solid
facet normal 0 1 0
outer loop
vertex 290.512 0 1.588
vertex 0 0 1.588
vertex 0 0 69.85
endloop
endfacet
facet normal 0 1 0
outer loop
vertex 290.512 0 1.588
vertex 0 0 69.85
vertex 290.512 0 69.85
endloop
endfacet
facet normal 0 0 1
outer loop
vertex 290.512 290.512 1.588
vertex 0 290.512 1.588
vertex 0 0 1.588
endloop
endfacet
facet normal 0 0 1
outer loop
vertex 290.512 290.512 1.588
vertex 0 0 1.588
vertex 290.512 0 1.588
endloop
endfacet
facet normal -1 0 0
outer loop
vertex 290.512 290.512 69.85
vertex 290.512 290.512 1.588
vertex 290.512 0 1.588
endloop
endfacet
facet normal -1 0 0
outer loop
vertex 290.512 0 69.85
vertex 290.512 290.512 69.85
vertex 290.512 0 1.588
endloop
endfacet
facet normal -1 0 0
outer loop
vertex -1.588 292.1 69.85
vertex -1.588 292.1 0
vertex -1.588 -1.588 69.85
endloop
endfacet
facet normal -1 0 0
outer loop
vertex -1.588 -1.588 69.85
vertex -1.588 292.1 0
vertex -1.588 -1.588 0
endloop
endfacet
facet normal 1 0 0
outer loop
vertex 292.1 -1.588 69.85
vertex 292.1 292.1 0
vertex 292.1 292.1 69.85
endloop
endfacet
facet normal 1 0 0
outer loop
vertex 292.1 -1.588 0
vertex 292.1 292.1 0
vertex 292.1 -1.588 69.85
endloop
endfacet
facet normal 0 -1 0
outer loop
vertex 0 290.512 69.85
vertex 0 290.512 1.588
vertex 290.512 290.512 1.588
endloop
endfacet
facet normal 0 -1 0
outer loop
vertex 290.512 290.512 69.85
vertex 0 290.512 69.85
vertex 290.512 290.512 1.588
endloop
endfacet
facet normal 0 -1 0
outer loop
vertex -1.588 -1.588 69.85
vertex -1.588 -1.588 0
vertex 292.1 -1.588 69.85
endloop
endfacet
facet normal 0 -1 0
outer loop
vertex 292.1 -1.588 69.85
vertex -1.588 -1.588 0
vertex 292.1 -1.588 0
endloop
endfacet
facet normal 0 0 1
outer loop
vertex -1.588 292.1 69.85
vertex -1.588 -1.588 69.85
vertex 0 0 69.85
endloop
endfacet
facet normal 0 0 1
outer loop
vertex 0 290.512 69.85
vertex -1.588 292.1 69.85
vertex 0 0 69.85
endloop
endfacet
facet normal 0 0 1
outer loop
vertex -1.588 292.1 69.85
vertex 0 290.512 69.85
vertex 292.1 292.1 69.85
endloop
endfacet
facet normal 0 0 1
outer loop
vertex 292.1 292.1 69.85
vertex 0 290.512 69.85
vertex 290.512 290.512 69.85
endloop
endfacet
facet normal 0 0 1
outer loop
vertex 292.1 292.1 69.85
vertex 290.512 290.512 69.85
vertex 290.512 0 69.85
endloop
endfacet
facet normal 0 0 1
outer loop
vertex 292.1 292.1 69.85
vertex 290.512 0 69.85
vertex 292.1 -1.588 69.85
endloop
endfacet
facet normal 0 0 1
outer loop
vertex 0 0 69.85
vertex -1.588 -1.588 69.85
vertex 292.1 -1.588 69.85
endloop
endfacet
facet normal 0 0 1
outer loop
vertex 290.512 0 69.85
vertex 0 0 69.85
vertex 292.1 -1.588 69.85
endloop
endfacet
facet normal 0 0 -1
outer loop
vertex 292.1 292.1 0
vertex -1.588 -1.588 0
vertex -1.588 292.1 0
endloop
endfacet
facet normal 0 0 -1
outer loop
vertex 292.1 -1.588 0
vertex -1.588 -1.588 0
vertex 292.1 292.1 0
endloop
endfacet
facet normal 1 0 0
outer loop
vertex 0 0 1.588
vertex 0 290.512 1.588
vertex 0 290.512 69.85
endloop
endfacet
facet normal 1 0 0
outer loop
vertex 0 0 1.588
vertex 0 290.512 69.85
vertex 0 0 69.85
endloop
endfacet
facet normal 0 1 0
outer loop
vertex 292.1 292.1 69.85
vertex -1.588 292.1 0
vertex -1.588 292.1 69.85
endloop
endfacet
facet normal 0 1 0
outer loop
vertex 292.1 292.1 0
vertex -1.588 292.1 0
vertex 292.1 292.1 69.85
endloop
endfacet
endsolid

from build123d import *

# Parameters (mm, degrees)
F0_W     = 290.5125
F0_H     = 290.5125
F1_DEPTH = 1.5875
F2_W     = 293.6875
F2_H     = 293.6875
F2_W_2   = 290.5125
F2_H_2   = 290.5125
F3_DEPTH = 69.85


# Not quite as in the source:
# - a length typed as a fraction of an inch, garbled in the dataset ("3 / 203.2 mm" for 3/8 in), is restored


with BuildPart() as f1:
    # F0 (on Top) → F1 (new body)
    with BuildSketch(Plane.XY):
        with Locations((145.25625, 145.25625)):
            Rectangle(F0_W, F0_H)
    extrude(amount=F1_DEPTH)

    # F2 (on face) → F3 (join)
    with BuildSketch(Plane(origin=(0, 0, 0), x_dir=(1, 0, 0), z_dir=(0, 0, -1))):
        with Locations((145.25625, -145.25625)):
            Rectangle(F2_W, F2_H)
        with Locations((145.25625, -145.25625)):
            Rectangle(F2_W_2, F2_H_2, mode=Mode.SUBTRACT)
    extrude(amount=-F3_DEPTH)


solid = f1.part
